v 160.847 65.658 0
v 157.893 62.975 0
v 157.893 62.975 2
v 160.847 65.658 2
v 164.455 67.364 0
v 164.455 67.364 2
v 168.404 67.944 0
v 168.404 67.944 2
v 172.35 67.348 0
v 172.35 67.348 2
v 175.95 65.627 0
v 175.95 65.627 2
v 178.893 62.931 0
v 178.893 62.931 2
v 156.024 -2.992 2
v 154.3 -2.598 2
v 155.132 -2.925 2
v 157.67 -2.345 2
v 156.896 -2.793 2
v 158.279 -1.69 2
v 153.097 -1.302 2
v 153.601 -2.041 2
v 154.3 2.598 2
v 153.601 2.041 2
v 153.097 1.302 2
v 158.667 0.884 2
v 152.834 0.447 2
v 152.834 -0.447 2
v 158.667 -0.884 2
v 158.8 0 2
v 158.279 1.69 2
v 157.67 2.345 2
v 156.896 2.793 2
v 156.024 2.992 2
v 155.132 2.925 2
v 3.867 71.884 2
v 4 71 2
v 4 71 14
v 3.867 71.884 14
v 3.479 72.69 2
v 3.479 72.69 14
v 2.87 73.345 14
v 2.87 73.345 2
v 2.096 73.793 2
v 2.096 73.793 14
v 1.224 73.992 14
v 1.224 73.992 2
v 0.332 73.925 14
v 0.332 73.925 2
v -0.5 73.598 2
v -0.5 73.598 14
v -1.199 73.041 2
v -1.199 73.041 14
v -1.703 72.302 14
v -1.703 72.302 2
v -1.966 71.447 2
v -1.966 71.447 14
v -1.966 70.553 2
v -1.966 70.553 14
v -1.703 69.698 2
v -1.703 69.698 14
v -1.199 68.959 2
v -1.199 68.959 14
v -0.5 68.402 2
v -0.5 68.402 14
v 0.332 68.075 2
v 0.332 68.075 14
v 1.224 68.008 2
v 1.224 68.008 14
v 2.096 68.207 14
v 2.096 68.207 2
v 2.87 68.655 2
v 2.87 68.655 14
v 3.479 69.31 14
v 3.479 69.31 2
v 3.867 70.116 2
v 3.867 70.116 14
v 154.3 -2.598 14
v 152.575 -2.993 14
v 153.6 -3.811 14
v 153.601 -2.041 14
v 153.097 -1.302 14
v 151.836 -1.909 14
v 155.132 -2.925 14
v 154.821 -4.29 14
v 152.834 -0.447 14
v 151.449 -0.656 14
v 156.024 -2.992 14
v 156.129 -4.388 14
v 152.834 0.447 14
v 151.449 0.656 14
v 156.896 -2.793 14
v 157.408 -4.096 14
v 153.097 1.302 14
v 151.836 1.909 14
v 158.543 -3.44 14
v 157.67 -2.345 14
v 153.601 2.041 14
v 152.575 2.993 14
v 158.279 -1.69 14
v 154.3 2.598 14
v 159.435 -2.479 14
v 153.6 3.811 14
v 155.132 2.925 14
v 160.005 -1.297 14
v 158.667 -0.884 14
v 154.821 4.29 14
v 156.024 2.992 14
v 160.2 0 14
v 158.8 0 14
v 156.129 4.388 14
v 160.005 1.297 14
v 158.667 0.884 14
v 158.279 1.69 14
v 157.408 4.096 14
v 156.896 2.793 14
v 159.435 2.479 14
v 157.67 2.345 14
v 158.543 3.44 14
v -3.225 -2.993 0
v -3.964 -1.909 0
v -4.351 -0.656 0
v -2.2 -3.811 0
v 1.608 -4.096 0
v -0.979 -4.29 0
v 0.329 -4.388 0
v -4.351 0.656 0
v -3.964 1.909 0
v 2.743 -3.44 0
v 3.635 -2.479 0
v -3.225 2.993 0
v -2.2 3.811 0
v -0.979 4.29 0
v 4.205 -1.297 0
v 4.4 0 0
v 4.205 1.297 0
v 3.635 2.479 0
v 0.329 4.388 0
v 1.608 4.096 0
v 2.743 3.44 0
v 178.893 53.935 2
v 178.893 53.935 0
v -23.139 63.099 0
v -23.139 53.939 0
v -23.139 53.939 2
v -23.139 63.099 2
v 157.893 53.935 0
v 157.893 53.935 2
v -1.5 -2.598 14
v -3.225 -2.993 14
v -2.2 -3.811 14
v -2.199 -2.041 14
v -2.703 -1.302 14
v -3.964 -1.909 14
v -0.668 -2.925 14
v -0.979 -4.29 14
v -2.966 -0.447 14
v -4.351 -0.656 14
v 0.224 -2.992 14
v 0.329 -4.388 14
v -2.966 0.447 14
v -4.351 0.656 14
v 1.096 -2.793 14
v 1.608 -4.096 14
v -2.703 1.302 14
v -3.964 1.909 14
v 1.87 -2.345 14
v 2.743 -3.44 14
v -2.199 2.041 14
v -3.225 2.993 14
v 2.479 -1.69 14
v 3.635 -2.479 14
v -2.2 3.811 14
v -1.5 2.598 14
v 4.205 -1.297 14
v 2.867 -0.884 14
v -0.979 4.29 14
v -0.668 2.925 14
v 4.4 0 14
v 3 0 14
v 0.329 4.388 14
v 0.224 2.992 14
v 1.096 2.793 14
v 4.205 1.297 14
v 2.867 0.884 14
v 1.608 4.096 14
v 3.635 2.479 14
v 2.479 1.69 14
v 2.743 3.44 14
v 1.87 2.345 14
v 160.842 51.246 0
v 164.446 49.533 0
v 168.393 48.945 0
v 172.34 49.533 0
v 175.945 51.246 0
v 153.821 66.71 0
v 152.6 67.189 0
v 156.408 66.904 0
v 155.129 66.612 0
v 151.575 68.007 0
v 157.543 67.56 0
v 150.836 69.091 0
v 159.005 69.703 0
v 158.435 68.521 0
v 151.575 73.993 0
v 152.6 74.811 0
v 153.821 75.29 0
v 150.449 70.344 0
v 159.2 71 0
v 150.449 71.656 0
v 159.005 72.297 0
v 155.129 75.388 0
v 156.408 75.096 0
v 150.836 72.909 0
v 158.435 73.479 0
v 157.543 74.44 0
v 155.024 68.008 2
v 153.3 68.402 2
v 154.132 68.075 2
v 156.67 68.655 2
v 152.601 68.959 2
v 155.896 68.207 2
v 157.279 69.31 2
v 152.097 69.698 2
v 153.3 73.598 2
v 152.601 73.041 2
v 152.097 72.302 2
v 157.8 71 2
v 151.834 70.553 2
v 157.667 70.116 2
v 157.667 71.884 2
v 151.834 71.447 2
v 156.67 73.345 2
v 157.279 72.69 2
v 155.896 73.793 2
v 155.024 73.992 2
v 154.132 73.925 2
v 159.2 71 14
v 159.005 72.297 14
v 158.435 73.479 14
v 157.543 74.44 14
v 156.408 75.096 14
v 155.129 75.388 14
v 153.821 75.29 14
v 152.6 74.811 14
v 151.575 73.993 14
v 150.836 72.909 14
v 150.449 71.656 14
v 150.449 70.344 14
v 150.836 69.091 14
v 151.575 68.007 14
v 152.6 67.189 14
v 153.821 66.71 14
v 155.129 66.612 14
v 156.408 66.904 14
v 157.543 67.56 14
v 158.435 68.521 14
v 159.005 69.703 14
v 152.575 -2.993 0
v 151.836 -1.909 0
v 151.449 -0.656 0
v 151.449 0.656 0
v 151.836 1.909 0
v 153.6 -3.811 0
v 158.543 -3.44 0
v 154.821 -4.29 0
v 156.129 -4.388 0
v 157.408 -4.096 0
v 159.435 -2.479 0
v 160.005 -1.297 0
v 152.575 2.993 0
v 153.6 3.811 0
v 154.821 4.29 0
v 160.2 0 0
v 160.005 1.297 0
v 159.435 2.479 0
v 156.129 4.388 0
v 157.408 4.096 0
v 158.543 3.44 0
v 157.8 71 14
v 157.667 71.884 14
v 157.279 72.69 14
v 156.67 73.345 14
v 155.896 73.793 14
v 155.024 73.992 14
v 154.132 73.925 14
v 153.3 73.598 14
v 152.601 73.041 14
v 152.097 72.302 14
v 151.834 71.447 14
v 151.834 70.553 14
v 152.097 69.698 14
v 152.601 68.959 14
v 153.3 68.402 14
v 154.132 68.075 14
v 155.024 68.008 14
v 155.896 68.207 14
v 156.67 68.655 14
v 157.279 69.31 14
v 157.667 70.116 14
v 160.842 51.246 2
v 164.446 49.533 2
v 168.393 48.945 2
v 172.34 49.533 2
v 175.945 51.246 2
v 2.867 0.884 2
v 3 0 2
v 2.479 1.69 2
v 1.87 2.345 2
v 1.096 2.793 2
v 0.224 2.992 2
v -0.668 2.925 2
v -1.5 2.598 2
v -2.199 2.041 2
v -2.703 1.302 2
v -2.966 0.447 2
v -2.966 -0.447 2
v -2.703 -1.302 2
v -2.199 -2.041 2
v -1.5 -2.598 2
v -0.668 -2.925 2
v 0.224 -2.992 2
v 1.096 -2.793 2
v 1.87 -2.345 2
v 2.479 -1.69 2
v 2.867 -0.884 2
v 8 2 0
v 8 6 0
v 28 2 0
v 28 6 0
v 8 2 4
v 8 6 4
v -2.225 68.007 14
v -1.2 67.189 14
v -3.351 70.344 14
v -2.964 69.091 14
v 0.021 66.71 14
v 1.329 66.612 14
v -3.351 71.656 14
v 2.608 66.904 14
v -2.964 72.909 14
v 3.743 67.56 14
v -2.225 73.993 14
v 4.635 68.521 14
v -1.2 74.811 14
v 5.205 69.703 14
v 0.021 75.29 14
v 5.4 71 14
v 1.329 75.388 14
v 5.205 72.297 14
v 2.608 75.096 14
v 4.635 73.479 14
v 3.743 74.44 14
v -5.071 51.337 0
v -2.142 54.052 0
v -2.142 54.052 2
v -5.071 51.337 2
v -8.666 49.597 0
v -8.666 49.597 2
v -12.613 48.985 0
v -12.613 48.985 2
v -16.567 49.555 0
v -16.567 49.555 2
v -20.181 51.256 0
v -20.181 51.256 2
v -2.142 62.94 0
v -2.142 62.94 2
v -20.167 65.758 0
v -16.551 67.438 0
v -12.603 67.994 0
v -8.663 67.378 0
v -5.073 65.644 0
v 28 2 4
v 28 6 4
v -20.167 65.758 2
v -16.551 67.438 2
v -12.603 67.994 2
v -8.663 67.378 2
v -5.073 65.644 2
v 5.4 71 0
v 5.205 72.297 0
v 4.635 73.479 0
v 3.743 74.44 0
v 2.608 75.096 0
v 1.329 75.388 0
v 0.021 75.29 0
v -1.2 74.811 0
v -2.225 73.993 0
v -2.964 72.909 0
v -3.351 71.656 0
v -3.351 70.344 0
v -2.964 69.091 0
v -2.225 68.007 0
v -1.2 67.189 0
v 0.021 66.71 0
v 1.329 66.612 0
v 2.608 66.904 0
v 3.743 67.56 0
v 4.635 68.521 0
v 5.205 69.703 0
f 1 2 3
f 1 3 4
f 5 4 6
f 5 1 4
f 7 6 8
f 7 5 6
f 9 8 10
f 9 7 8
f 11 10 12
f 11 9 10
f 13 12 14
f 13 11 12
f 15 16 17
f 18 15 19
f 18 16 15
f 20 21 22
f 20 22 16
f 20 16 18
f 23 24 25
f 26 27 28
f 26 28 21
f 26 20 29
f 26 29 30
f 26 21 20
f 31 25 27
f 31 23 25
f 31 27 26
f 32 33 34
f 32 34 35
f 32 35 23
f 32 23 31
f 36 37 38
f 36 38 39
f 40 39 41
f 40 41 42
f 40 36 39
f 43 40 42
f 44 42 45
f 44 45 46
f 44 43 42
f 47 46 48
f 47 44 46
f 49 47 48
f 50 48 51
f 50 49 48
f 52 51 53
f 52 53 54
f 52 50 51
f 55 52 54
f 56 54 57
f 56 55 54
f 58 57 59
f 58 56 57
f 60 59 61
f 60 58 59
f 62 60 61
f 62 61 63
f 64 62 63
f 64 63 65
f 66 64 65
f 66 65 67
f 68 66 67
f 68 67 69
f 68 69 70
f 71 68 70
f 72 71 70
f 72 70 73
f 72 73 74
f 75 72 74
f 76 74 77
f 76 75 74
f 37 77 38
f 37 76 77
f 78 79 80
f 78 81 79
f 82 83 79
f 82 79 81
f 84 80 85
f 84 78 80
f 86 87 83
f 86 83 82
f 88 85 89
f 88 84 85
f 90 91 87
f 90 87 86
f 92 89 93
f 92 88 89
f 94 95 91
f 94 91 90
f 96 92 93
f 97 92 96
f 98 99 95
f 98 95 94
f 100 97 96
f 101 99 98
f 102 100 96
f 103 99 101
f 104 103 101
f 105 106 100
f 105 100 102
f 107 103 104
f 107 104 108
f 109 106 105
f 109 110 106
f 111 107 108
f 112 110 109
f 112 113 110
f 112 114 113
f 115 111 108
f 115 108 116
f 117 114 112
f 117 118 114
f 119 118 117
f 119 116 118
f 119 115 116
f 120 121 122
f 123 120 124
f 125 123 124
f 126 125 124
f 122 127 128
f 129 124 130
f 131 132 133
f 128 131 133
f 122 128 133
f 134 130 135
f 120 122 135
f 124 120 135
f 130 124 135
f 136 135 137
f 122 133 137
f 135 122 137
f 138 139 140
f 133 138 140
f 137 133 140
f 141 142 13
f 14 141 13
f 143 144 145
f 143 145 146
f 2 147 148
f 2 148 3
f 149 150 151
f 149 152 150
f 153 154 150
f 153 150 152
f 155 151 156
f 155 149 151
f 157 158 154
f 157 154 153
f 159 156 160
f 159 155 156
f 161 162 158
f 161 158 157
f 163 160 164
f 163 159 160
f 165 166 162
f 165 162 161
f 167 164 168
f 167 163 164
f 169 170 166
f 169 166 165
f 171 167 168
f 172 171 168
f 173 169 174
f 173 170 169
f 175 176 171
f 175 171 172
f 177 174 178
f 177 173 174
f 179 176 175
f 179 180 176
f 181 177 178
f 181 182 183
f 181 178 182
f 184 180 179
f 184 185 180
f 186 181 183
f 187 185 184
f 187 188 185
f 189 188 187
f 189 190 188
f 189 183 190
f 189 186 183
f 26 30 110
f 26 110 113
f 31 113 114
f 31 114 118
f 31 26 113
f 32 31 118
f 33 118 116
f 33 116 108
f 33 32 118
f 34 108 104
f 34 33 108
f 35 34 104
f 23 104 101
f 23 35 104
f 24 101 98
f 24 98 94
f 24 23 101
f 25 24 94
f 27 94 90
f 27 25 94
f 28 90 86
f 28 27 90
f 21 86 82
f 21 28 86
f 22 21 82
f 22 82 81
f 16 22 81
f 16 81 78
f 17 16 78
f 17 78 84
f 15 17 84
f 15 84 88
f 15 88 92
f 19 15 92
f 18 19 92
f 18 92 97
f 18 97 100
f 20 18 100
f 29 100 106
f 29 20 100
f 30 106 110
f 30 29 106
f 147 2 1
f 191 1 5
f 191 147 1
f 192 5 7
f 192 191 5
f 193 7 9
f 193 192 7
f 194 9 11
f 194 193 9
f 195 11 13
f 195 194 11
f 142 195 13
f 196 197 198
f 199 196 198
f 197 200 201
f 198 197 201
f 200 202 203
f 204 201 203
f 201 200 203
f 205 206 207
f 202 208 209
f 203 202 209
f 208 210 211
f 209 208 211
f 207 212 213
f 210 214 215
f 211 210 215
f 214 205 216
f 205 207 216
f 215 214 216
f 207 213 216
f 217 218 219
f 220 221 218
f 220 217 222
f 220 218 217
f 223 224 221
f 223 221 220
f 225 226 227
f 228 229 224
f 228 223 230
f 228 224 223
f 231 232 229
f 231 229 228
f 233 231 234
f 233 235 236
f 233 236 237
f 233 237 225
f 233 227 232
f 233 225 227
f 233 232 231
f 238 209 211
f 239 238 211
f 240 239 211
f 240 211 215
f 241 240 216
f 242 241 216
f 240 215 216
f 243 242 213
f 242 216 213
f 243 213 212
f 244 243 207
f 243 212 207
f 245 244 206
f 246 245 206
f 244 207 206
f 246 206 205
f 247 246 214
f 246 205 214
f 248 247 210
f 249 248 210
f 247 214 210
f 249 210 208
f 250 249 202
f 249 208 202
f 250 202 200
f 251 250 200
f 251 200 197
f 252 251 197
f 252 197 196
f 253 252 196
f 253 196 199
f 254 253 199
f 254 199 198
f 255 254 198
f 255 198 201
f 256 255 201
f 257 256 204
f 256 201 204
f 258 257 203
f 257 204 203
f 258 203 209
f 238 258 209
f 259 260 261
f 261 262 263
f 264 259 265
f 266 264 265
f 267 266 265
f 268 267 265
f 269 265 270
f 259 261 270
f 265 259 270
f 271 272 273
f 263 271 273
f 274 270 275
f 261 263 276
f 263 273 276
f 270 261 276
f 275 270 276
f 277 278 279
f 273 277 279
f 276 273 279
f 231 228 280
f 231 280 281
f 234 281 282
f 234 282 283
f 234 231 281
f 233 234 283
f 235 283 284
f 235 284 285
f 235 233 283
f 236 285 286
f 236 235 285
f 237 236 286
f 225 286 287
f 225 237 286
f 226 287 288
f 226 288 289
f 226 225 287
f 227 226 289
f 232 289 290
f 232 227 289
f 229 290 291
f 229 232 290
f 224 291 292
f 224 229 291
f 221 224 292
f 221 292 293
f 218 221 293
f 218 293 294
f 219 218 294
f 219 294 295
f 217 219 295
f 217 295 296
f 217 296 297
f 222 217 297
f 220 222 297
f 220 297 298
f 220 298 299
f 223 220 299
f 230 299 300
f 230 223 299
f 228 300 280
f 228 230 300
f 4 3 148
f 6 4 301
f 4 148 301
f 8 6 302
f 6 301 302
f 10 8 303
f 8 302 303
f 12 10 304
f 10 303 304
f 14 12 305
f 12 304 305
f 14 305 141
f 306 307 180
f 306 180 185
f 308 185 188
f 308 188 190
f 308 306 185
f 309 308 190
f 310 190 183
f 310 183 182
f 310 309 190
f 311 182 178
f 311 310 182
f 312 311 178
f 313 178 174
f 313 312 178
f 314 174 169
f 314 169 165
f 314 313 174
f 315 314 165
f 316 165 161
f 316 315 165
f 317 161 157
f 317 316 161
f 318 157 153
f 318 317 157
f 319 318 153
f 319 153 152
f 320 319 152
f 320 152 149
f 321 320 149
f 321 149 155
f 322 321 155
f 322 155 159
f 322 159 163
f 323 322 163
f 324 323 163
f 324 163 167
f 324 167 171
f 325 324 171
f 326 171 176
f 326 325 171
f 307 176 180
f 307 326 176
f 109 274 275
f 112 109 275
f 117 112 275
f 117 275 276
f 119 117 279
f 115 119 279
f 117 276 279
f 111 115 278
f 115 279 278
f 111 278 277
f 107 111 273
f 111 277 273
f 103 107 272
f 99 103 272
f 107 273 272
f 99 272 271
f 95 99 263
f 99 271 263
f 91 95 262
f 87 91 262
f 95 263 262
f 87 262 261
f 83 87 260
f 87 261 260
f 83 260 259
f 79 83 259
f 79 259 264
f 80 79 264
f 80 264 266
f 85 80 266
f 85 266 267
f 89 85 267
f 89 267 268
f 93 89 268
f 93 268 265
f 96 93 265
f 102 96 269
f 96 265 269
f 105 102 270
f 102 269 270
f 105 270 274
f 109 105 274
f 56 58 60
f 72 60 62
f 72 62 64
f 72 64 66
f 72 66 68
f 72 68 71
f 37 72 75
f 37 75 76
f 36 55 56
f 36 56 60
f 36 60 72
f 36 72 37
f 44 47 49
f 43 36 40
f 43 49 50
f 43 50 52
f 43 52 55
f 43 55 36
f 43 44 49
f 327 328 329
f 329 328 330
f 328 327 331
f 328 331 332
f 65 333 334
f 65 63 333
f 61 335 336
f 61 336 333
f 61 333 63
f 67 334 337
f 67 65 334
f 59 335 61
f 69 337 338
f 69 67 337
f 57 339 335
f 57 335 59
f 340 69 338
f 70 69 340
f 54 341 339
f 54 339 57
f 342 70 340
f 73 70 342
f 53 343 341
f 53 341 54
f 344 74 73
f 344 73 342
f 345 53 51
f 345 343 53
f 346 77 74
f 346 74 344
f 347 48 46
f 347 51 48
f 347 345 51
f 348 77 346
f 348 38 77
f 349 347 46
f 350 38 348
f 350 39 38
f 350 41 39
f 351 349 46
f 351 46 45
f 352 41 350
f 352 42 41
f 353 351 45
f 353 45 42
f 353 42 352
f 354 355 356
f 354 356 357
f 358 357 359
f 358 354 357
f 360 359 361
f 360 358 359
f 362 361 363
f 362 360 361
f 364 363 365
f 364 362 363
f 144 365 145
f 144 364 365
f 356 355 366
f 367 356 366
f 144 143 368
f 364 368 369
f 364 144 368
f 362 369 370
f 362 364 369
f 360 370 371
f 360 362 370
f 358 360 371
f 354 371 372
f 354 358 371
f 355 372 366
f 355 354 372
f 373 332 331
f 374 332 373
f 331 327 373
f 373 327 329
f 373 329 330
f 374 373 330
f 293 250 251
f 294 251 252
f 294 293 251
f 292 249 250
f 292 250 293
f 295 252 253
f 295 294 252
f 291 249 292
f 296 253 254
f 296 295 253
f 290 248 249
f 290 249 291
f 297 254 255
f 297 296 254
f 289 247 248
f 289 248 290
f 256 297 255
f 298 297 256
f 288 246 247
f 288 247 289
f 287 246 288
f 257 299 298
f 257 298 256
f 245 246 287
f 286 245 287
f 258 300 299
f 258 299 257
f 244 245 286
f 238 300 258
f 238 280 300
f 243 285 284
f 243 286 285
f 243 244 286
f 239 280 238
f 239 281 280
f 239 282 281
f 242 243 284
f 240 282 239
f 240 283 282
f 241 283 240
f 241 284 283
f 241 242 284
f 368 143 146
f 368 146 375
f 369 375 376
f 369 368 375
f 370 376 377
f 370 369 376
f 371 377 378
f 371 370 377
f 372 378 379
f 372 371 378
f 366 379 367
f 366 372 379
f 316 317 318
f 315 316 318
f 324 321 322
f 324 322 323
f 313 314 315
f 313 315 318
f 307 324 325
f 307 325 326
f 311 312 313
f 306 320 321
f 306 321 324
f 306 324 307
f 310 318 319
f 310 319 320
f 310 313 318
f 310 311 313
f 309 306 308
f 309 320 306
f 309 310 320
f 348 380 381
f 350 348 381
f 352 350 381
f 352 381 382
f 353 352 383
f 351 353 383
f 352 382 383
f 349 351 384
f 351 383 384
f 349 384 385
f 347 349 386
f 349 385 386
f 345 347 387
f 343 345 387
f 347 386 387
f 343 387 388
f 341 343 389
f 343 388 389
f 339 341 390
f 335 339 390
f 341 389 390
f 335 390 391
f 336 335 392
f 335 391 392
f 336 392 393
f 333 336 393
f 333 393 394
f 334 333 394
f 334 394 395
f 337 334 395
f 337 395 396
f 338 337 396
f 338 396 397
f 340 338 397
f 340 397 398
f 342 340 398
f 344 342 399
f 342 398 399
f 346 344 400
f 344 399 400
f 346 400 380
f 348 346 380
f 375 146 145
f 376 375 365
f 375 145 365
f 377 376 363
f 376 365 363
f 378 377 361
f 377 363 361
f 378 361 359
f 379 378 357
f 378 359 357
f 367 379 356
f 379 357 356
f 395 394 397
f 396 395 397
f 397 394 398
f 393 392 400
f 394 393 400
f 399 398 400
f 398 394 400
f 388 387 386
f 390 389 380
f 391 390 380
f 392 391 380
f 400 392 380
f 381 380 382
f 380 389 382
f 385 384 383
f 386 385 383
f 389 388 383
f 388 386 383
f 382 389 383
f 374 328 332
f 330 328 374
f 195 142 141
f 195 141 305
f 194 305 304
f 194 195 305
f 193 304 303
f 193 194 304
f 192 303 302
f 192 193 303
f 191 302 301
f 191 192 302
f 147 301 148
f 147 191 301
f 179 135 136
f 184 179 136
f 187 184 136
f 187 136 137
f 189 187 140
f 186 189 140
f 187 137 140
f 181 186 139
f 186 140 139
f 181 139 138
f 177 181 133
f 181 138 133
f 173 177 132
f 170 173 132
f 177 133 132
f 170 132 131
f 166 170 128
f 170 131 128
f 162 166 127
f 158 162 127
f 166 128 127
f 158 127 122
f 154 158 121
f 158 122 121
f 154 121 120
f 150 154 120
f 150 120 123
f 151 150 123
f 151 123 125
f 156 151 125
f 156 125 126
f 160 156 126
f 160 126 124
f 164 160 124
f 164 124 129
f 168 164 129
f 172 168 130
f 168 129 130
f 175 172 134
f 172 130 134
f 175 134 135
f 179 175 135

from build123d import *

# Parameters (mm, degrees)
PAD002_DEPTH      = 2
PAD001_DEPTH      = 2
CYLINDER005_R     = 3
CYLINDER005_DEPTH = 12
CYLINDER001_R     = 4.4
CYLINDER001_DEPTH = 14
CYLINDER006_R     = 3
CYLINDER006_DEPTH = 12
CYLINDER002_R     = 4.4
CYLINDER002_DEPTH = 14
CYLINDER007_R     = 3
CYLINDER007_DEPTH = 12
CYLINDER003_R     = 4.4
CYLINDER003_DEPTH = 14
CYLINDER004_R     = 3
CYLINDER004_DEPTH = 12
CYLINDER_R        = 4.4
CYLINDER_DEPTH    = 14
BOX001_W          = 20
BOX001_H          = 4
BOX001_DEPTH      = 4


with BuildPart() as pad002:
    # Sketch003 → Pad002 (new body)
    with BuildSketch(Plane(origin=(0, 0, 0), x_dir=(1, 0, 0), z_dir=(0, 0, -1))):
        with BuildLine():
            ThreePointArc((178.893232, -53.934706), (168.393174, -48.944611), (157.893232, -53.934952))
            Line((157.893232, -53.934952), (157.893232, -62.974569))
            ThreePointArc((157.893232, -62.974569), (168.403507, -67.944051), (178.893232, -62.931336))
            Line((178.893232, -53.934706), (178.893232, -62.931336))
        make_face()
    extrude(amount=-PAD002_DEPTH)


with BuildPart() as fusion:
    # Sketch002 → Pad001 (new body)
    with BuildSketch(Plane(origin=(0, 0, 0), x_dir=(1, 0, 0), z_dir=(0, 0, -1))):
        with BuildLine():
            ThreePointArc((-2.141905, -54.052414), (-12.613383, -48.985427), (-23.138757, -53.93949))
            Line((-23.138757, -53.93949), (-23.138757, -63.099138))
            ThreePointArc((-23.138757, -63.099138), (-12.602642, -67.994215), (-2.141905, -62.940062))
            Line((-2.141905, -54.052414), (-2.141905, -62.940062))
        make_face()
    extrude(amount=-PAD001_DEPTH)

    # Fusion: union Pad002
    add(pad002.part)


with BuildPart() as cylinder005:
    # Cylinder005 → Cylinder005 (new body)
    with BuildSketch(Plane(origin=(155.8, 0, 2), x_dir=(1, 0, 0), z_dir=(0, 0, 1))):
        Circle(CYLINDER005_R)
    extrude(amount=CYLINDER005_DEPTH)


with BuildPart() as cut001:
    # Cylinder001 → Cylinder001 (new body)
    with BuildSketch(Plane(origin=(155.8, 0, 0), x_dir=(1, 0, 0), z_dir=(0, 0, 1))):
        Circle(CYLINDER001_R)
    extrude(amount=CYLINDER001_DEPTH)

    # Cut001: cut Cylinder005
    add(cylinder005.part, mode=Mode.SUBTRACT)


with BuildPart() as cylinder006:
    # Cylinder006 → Cylinder006 (new body)
    with BuildSketch(Plane(origin=(155.8, 71, 2), x_dir=(1, 0, 0), z_dir=(0, 0, 1))):
        Circle(CYLINDER006_R)
    extrude(amount=CYLINDER006_DEPTH)


with BuildPart() as cut002:
    # Cylinder002 → Cylinder002 (new body)
    with BuildSketch(Plane(origin=(155.8, 71, 0), x_dir=(1, 0, 0), z_dir=(0, 0, 1))):
        Circle(CYLINDER002_R)
    extrude(amount=CYLINDER002_DEPTH)

    # Cut002: cut Cylinder006
    add(cylinder006.part, mode=Mode.SUBTRACT)


with BuildPart() as cut002_1:
    # Cut002 placement: moved
    add(cut002.part.moved(Location((-1, 0, 0))))


with BuildPart() as cylinder007:
    # Cylinder007 → Cylinder007 (new body)
    with BuildSketch(Plane(origin=(0, 71, 2), x_dir=(1, 0, 0), z_dir=(0, 0, 1))):
        Circle(CYLINDER007_R)
    extrude(amount=CYLINDER007_DEPTH)


with BuildPart() as cut003:
    # Cylinder003 → Cylinder003 (new body)
    with BuildSketch(Plane(origin=(0, 71, 0), x_dir=(1, 0, 0), z_dir=(0, 0, 1))):
        Circle(CYLINDER003_R)
    extrude(amount=CYLINDER003_DEPTH)

    # Cut003: cut Cylinder007
    add(cylinder007.part, mode=Mode.SUBTRACT)


with BuildPart() as cut003_1:
    # Cut003 placement: moved
    add(cut003.part.moved(Location((1, 0, 0))))


with BuildPart() as cylinder004:
    # Cylinder004 → Cylinder004 (new body)
    with BuildSketch(Plane.XY.offset(2)):
        Circle(CYLINDER004_R)
    extrude(amount=CYLINDER004_DEPTH)


with BuildPart() as fusion001:
    # Cylinder → Cylinder (new body)
    with BuildSketch(Plane.XY):
        Circle(CYLINDER_R)
    extrude(amount=CYLINDER_DEPTH)

    # Cut: cut Cylinder004
    add(cylinder004.part, mode=Mode.SUBTRACT)

    # Fusion001: union Cut001, Cut002, Cut003
    add(cut001.part)
    add(cut002_1.part)
    add(cut003_1.part)


with BuildPart() as cube001:
    # Box001 → Box001 (new body)
    with BuildSketch(Plane(origin=(8, 2, 0), x_dir=(1, 0, 0), z_dir=(0, 0, 1))):
        with Locations((10, 2)):
            Rectangle(BOX001_W, BOX001_H)
    extrude(amount=BOX001_DEPTH)


solid = Compound([fusion.part, fusion001.part, cube001.part])
